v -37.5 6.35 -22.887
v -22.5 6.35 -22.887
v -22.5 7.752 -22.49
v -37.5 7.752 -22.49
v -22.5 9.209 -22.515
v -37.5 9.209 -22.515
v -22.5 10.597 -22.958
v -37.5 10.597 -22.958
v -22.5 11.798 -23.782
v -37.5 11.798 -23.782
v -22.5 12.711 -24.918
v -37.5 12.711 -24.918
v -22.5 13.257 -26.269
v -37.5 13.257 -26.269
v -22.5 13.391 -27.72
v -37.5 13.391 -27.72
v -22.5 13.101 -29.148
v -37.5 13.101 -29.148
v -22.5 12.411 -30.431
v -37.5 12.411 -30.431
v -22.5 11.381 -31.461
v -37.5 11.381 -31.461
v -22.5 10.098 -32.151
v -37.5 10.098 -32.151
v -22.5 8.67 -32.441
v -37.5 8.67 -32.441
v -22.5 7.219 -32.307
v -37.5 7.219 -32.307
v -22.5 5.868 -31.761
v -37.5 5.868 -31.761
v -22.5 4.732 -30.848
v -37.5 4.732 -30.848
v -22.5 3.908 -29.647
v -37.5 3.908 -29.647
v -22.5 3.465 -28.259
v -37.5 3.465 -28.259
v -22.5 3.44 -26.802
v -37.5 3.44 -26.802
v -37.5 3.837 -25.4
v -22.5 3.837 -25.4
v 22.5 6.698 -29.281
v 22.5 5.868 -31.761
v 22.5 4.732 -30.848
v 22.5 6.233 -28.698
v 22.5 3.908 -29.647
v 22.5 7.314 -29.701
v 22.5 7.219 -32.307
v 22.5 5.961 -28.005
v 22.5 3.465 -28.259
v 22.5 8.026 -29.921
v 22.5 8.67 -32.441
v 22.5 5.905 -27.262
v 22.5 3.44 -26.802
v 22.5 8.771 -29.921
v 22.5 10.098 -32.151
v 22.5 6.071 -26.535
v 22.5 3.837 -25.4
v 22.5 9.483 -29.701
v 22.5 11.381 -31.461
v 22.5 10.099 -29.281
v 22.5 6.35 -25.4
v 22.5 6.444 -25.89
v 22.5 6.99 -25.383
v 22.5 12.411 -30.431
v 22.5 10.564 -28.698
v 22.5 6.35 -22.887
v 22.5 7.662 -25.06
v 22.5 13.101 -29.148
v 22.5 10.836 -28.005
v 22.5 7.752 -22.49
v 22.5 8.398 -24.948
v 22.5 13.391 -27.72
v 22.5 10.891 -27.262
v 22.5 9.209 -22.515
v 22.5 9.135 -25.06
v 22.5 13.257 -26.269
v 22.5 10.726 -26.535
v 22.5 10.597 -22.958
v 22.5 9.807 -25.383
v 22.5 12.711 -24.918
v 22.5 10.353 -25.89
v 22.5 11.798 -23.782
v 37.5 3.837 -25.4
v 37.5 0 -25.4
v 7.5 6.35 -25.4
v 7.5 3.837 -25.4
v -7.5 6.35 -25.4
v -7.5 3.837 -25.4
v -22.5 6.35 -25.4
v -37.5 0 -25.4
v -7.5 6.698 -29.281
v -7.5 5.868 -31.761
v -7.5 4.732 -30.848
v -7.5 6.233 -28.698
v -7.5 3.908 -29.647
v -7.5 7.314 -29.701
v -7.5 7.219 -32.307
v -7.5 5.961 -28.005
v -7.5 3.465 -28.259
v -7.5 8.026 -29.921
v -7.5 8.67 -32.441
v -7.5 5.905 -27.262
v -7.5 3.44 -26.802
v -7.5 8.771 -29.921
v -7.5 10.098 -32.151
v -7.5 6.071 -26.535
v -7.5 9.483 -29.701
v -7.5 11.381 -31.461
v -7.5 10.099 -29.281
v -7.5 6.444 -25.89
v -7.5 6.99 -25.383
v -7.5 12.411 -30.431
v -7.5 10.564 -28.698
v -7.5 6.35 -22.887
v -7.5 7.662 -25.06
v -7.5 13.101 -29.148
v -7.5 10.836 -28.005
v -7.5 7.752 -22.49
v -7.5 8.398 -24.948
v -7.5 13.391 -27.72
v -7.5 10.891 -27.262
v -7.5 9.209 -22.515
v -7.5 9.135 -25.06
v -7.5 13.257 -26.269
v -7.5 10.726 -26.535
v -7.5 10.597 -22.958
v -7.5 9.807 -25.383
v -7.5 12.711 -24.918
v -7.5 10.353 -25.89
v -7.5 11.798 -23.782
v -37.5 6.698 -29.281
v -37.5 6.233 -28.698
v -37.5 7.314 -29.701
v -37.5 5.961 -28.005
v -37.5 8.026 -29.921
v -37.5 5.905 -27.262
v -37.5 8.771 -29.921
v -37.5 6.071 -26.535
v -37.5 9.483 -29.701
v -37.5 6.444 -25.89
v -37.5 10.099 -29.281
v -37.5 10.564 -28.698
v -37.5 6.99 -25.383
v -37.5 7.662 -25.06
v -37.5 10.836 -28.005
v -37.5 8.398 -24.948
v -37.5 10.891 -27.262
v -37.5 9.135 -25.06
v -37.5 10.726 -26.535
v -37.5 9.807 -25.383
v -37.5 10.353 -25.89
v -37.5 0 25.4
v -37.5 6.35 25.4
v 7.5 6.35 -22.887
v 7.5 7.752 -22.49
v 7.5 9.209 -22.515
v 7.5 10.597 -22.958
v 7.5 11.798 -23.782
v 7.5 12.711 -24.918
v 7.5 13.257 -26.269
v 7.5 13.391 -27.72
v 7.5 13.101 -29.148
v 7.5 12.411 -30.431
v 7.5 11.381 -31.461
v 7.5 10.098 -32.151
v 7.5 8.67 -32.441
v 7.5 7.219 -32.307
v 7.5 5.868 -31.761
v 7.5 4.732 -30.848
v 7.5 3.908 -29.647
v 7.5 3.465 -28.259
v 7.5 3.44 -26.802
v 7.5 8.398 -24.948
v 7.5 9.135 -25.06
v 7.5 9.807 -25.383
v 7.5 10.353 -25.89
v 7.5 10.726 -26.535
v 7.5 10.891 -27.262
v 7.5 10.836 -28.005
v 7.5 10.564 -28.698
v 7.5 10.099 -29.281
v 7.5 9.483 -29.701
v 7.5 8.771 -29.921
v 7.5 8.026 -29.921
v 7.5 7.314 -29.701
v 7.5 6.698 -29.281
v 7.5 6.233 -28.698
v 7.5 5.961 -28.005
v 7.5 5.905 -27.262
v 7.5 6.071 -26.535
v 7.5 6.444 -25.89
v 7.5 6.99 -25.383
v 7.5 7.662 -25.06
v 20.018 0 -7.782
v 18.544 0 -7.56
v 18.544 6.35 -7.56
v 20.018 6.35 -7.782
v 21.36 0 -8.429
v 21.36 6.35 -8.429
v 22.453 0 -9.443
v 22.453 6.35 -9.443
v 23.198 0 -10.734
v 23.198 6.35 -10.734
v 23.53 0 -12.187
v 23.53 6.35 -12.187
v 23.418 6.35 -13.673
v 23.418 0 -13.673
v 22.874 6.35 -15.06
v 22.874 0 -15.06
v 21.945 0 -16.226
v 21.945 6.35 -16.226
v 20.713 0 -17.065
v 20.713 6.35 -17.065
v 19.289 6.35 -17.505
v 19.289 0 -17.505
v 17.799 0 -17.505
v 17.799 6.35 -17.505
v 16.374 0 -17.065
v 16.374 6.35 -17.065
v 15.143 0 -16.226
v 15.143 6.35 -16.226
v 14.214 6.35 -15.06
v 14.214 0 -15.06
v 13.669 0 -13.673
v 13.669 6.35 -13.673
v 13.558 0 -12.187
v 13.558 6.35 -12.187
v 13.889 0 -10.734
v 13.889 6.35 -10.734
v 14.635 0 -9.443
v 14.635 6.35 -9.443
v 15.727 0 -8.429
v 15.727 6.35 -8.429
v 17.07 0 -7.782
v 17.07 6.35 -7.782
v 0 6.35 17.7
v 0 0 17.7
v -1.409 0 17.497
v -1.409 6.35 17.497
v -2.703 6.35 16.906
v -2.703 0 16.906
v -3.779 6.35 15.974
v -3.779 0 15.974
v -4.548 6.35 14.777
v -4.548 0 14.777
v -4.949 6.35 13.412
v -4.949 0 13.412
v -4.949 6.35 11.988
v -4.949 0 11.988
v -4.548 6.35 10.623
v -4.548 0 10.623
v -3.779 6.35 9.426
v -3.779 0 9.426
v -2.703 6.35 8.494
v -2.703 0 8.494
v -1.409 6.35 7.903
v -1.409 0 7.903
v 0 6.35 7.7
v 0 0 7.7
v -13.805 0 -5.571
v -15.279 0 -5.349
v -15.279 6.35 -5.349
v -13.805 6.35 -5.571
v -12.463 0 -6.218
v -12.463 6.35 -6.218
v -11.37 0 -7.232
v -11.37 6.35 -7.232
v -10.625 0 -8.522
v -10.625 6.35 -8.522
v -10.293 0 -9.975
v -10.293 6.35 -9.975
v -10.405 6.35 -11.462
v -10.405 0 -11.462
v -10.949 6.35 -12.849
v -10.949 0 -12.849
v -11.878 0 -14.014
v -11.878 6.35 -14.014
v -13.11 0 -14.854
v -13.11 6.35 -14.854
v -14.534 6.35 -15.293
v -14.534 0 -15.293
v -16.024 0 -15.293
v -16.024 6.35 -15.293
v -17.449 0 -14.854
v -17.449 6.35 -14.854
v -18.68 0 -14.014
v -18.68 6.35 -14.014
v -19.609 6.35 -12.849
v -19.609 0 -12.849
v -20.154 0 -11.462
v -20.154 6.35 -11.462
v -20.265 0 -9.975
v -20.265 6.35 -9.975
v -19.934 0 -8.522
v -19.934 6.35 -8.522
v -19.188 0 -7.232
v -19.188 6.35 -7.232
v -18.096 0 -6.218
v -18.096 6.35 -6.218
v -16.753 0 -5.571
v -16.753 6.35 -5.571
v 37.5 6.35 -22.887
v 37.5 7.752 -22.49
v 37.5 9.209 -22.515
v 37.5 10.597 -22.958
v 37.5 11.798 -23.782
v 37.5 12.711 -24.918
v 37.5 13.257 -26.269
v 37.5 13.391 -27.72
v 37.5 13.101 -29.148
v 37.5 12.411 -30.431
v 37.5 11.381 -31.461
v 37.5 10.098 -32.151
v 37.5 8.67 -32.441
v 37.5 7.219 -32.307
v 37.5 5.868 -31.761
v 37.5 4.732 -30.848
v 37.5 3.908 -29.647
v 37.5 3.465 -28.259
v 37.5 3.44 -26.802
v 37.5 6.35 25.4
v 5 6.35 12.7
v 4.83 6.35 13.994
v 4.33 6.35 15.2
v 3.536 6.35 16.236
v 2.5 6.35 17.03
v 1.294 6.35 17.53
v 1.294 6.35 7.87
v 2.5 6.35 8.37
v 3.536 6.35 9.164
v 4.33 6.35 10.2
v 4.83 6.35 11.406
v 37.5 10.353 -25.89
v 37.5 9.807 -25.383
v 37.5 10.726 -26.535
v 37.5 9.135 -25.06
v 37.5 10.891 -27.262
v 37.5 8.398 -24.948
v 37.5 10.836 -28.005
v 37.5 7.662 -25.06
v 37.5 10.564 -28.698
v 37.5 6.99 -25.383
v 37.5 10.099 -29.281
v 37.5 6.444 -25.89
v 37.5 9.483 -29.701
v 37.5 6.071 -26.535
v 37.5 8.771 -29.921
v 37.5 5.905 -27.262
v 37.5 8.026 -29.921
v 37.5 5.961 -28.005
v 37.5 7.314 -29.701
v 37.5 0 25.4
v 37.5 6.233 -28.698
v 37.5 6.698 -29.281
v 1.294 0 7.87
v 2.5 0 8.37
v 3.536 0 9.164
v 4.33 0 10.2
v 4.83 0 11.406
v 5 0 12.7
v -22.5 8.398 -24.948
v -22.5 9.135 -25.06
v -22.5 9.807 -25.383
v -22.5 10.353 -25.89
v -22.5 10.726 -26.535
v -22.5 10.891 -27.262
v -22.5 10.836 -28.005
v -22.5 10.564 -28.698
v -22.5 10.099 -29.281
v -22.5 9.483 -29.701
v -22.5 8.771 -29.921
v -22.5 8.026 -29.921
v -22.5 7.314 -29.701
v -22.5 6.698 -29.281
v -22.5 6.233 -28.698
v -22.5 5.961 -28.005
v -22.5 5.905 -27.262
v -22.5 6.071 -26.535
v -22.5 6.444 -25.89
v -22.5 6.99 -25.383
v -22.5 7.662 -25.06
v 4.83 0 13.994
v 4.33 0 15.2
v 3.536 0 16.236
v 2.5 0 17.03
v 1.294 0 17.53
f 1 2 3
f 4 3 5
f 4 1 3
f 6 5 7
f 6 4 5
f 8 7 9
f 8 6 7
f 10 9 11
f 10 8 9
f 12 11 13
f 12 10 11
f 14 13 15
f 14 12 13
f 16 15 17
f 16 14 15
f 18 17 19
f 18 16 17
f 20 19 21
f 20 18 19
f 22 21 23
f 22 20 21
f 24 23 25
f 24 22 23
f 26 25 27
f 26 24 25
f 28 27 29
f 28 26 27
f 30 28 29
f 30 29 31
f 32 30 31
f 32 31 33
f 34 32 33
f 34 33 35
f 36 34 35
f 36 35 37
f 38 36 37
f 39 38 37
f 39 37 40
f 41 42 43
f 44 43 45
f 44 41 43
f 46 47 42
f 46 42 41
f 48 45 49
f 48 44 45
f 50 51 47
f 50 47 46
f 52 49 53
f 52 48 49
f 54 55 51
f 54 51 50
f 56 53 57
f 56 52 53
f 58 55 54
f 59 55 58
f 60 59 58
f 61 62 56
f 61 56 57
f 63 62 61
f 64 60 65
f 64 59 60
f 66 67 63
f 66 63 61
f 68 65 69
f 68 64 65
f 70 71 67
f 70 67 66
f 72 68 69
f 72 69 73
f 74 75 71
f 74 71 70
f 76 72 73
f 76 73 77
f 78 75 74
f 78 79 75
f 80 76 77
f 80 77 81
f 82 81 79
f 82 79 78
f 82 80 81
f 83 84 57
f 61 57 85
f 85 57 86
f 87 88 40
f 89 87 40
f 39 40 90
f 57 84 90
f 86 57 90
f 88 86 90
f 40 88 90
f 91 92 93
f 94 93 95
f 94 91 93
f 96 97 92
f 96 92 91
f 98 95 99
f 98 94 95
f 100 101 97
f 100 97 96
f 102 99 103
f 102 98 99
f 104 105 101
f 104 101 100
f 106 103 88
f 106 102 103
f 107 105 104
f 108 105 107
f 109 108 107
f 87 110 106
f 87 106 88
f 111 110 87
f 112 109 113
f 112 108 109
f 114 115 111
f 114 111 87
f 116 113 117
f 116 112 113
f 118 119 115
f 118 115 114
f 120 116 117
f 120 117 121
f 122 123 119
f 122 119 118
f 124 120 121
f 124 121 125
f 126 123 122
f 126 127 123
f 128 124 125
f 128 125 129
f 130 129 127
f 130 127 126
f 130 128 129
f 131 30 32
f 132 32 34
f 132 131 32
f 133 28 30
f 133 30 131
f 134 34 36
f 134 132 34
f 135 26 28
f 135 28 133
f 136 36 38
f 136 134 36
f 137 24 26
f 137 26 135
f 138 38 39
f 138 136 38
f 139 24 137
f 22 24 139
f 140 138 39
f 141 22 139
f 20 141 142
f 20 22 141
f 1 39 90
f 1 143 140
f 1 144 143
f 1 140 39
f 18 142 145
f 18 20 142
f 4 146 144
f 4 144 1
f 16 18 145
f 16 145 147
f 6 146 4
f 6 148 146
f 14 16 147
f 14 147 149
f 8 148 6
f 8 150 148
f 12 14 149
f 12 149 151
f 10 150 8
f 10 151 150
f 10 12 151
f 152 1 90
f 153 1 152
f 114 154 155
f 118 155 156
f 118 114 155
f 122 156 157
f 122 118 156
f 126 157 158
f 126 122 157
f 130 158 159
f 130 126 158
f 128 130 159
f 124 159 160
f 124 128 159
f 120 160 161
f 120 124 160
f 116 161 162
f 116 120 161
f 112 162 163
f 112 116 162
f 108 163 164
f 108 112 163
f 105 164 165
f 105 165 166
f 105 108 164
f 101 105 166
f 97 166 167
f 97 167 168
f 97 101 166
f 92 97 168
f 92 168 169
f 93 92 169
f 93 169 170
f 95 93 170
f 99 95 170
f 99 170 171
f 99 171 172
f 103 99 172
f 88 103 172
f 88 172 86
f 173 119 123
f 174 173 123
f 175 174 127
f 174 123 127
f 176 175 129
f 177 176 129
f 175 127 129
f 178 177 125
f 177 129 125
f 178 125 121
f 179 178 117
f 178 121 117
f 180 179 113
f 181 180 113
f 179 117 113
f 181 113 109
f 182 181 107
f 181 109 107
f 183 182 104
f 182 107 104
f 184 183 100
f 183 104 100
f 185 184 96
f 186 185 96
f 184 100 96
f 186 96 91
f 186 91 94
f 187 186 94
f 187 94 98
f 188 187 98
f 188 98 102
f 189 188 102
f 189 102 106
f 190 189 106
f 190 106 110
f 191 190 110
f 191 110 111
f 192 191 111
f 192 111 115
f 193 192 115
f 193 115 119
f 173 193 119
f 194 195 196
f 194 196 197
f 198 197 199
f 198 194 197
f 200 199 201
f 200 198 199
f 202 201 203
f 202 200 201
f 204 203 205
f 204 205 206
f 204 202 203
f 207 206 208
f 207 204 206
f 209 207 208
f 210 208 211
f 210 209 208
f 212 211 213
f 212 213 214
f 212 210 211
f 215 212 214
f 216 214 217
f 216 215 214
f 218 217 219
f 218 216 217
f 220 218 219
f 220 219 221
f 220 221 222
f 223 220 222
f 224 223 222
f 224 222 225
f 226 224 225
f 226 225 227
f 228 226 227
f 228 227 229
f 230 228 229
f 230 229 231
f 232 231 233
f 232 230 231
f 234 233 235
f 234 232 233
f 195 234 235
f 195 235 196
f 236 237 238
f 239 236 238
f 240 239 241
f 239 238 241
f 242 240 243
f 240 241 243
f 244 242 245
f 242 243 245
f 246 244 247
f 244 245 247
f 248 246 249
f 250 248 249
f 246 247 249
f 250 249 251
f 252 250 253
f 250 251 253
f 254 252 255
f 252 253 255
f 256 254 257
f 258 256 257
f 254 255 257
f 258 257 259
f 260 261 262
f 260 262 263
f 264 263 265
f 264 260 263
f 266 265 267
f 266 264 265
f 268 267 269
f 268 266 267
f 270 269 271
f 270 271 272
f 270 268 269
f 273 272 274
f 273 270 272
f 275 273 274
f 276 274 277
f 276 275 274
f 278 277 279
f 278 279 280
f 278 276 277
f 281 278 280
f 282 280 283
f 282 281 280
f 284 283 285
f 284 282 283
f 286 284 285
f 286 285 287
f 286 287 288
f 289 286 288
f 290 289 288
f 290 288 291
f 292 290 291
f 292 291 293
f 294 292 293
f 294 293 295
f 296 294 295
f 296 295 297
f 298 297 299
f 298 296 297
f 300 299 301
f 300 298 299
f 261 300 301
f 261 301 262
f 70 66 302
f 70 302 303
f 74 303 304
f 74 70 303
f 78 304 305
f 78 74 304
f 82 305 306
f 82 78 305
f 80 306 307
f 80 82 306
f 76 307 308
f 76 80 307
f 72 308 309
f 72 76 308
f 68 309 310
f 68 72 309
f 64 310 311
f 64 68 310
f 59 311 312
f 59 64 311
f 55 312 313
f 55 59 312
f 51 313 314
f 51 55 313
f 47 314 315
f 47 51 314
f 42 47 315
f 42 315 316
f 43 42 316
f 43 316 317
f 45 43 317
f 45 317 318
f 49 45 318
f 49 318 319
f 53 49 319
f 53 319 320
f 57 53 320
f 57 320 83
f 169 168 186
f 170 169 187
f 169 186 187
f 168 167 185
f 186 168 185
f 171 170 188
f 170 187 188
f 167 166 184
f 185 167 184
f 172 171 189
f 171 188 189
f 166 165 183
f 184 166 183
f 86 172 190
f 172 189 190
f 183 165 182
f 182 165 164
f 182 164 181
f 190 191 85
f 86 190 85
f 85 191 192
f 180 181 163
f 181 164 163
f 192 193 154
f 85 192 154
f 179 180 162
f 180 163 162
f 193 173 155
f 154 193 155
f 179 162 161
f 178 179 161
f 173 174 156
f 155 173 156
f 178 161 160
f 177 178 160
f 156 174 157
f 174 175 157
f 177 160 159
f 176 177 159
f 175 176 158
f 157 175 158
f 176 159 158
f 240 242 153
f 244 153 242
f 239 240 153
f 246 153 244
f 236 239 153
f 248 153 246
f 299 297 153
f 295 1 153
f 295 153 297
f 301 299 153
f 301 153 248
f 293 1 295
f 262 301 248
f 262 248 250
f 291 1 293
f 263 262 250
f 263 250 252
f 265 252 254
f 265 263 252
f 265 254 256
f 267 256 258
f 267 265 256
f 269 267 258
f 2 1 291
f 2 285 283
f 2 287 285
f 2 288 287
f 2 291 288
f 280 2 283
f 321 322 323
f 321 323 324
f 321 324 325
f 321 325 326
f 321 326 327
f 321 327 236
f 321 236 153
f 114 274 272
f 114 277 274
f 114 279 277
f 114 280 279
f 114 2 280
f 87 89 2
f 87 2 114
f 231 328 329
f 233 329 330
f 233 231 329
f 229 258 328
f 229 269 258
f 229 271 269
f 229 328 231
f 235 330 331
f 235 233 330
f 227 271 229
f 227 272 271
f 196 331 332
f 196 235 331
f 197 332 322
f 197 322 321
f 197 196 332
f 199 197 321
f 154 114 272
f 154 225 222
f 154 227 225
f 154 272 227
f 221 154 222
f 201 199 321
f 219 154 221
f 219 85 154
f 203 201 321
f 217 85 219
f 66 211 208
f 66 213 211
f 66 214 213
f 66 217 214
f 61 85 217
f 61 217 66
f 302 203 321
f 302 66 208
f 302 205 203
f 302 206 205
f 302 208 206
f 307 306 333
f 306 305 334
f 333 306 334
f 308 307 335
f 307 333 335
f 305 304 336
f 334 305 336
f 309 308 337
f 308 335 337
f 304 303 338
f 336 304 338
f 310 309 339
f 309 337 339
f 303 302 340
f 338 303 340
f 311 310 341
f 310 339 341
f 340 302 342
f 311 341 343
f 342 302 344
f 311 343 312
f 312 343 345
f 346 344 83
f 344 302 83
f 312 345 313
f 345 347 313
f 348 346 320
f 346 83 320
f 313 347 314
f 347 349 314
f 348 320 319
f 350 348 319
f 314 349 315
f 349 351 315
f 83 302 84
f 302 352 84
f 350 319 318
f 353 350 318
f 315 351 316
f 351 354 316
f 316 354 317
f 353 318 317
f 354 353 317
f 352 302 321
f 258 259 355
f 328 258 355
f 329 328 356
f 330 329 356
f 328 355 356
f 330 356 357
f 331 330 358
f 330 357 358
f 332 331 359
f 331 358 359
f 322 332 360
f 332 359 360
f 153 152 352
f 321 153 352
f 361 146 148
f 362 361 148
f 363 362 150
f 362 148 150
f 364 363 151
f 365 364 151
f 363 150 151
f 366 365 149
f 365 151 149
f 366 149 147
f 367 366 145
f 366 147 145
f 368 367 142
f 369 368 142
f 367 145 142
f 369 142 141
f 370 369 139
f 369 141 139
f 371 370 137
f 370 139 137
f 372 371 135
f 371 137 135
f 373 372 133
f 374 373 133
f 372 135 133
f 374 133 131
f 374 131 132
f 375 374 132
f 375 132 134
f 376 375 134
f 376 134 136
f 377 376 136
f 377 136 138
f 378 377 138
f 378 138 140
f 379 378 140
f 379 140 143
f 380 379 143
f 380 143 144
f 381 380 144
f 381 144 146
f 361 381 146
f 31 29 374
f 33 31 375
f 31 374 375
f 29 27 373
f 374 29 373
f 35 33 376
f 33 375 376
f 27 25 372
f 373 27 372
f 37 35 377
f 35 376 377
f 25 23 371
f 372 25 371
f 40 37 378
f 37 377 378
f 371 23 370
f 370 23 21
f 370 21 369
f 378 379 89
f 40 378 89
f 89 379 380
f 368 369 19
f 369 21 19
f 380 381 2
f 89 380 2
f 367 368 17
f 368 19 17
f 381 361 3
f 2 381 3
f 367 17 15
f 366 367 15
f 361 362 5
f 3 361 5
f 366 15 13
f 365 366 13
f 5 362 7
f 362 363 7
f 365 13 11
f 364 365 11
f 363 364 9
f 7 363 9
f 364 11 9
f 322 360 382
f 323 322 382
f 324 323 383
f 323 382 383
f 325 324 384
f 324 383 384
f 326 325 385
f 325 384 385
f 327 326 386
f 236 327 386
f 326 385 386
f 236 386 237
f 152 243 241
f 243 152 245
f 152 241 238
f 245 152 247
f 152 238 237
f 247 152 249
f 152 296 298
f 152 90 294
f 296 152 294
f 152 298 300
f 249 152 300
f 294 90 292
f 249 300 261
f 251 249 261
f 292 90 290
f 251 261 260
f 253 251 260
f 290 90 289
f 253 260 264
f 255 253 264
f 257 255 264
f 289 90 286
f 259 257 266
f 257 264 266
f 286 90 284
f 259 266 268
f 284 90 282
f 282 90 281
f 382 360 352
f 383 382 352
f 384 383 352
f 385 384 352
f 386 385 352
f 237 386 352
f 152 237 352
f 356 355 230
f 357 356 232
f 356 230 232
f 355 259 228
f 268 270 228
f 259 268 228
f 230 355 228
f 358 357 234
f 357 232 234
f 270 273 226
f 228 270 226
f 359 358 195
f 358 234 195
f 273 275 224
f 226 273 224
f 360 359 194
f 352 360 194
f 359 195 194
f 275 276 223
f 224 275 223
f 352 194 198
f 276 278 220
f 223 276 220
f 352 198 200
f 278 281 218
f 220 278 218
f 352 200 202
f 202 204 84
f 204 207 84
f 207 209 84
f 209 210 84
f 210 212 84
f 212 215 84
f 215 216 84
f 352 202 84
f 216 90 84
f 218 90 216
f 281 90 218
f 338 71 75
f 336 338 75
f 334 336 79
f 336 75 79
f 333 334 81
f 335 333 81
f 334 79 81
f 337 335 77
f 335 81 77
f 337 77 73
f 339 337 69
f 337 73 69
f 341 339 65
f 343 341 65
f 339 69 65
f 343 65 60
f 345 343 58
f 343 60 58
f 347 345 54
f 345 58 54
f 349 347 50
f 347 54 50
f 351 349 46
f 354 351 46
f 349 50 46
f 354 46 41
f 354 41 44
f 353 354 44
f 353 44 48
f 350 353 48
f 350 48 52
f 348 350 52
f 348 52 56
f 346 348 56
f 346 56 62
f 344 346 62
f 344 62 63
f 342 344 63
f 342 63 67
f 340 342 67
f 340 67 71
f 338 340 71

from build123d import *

# Parameters (mm, degrees)
SKETCH1_W           = 75
SKETCH1_H           = 50.8
SKETCH1_R           = 5
BOSS_EXTRUDE1_DEPTH = 6.35
SKETCH2_R           = 5
BOSS_EXTRUDE2_DEPTH = 15
LPATTERN1_COUNT     = 3
LPATTERN1_PITCH     = 30
SKETCH2_4_R         = 2.5
CUT_EXTRUDE2_DEPTH  = 83.80956065


with BuildPart() as part:
    # Sketch1 → Boss-Extrude1 (new body)
    with BuildSketch(Plane(origin=(0, 0, 0), x_dir=(1, 0, 0), z_dir=(0, 1, 0))):
        Rectangle(SKETCH1_W, SKETCH1_H)
        with Locations((0, -12.7)):
            Circle(SKETCH1_R, mode=Mode.SUBTRACT)
        with Locations((-15.279173033, 10.349093201)):
            Circle(SKETCH1_R, mode=Mode.SUBTRACT)
        with Locations((18.543836974, 12.56035891)):
            Circle(SKETCH1_R, mode=Mode.SUBTRACT)
    extrude(amount=BOSS_EXTRUDE1_DEPTH)

    # Sketch2 → Boss-Extrude2 (add)
    with BuildSketch(Plane.ZY.offset(37.5)):
        with Locations((-27.448482339, 8.398482339)):
            Circle(SKETCH2_R)
    boss_extrude2 = extrude(amount=-BOSS_EXTRUDE2_DEPTH)

    # LPattern1: Boss-Extrude2 ×3
    with Locations(*[(i * LPATTERN1_PITCH, 0, 0) for i in range(1, LPATTERN1_COUNT)]):
        add(boss_extrude2)

    # Sketch2<4> → Cut-Extrude2 (cut, through all)
    with BuildSketch(Plane.ZY.offset(37.5)):
        with Locations((-27.448482339, 8.398482339)):
            Circle(SKETCH2_4_R)
    extrude(amount=-CUT_EXTRUDE2_DEPTH, mode=Mode.SUBTRACT)


solid = part.part
